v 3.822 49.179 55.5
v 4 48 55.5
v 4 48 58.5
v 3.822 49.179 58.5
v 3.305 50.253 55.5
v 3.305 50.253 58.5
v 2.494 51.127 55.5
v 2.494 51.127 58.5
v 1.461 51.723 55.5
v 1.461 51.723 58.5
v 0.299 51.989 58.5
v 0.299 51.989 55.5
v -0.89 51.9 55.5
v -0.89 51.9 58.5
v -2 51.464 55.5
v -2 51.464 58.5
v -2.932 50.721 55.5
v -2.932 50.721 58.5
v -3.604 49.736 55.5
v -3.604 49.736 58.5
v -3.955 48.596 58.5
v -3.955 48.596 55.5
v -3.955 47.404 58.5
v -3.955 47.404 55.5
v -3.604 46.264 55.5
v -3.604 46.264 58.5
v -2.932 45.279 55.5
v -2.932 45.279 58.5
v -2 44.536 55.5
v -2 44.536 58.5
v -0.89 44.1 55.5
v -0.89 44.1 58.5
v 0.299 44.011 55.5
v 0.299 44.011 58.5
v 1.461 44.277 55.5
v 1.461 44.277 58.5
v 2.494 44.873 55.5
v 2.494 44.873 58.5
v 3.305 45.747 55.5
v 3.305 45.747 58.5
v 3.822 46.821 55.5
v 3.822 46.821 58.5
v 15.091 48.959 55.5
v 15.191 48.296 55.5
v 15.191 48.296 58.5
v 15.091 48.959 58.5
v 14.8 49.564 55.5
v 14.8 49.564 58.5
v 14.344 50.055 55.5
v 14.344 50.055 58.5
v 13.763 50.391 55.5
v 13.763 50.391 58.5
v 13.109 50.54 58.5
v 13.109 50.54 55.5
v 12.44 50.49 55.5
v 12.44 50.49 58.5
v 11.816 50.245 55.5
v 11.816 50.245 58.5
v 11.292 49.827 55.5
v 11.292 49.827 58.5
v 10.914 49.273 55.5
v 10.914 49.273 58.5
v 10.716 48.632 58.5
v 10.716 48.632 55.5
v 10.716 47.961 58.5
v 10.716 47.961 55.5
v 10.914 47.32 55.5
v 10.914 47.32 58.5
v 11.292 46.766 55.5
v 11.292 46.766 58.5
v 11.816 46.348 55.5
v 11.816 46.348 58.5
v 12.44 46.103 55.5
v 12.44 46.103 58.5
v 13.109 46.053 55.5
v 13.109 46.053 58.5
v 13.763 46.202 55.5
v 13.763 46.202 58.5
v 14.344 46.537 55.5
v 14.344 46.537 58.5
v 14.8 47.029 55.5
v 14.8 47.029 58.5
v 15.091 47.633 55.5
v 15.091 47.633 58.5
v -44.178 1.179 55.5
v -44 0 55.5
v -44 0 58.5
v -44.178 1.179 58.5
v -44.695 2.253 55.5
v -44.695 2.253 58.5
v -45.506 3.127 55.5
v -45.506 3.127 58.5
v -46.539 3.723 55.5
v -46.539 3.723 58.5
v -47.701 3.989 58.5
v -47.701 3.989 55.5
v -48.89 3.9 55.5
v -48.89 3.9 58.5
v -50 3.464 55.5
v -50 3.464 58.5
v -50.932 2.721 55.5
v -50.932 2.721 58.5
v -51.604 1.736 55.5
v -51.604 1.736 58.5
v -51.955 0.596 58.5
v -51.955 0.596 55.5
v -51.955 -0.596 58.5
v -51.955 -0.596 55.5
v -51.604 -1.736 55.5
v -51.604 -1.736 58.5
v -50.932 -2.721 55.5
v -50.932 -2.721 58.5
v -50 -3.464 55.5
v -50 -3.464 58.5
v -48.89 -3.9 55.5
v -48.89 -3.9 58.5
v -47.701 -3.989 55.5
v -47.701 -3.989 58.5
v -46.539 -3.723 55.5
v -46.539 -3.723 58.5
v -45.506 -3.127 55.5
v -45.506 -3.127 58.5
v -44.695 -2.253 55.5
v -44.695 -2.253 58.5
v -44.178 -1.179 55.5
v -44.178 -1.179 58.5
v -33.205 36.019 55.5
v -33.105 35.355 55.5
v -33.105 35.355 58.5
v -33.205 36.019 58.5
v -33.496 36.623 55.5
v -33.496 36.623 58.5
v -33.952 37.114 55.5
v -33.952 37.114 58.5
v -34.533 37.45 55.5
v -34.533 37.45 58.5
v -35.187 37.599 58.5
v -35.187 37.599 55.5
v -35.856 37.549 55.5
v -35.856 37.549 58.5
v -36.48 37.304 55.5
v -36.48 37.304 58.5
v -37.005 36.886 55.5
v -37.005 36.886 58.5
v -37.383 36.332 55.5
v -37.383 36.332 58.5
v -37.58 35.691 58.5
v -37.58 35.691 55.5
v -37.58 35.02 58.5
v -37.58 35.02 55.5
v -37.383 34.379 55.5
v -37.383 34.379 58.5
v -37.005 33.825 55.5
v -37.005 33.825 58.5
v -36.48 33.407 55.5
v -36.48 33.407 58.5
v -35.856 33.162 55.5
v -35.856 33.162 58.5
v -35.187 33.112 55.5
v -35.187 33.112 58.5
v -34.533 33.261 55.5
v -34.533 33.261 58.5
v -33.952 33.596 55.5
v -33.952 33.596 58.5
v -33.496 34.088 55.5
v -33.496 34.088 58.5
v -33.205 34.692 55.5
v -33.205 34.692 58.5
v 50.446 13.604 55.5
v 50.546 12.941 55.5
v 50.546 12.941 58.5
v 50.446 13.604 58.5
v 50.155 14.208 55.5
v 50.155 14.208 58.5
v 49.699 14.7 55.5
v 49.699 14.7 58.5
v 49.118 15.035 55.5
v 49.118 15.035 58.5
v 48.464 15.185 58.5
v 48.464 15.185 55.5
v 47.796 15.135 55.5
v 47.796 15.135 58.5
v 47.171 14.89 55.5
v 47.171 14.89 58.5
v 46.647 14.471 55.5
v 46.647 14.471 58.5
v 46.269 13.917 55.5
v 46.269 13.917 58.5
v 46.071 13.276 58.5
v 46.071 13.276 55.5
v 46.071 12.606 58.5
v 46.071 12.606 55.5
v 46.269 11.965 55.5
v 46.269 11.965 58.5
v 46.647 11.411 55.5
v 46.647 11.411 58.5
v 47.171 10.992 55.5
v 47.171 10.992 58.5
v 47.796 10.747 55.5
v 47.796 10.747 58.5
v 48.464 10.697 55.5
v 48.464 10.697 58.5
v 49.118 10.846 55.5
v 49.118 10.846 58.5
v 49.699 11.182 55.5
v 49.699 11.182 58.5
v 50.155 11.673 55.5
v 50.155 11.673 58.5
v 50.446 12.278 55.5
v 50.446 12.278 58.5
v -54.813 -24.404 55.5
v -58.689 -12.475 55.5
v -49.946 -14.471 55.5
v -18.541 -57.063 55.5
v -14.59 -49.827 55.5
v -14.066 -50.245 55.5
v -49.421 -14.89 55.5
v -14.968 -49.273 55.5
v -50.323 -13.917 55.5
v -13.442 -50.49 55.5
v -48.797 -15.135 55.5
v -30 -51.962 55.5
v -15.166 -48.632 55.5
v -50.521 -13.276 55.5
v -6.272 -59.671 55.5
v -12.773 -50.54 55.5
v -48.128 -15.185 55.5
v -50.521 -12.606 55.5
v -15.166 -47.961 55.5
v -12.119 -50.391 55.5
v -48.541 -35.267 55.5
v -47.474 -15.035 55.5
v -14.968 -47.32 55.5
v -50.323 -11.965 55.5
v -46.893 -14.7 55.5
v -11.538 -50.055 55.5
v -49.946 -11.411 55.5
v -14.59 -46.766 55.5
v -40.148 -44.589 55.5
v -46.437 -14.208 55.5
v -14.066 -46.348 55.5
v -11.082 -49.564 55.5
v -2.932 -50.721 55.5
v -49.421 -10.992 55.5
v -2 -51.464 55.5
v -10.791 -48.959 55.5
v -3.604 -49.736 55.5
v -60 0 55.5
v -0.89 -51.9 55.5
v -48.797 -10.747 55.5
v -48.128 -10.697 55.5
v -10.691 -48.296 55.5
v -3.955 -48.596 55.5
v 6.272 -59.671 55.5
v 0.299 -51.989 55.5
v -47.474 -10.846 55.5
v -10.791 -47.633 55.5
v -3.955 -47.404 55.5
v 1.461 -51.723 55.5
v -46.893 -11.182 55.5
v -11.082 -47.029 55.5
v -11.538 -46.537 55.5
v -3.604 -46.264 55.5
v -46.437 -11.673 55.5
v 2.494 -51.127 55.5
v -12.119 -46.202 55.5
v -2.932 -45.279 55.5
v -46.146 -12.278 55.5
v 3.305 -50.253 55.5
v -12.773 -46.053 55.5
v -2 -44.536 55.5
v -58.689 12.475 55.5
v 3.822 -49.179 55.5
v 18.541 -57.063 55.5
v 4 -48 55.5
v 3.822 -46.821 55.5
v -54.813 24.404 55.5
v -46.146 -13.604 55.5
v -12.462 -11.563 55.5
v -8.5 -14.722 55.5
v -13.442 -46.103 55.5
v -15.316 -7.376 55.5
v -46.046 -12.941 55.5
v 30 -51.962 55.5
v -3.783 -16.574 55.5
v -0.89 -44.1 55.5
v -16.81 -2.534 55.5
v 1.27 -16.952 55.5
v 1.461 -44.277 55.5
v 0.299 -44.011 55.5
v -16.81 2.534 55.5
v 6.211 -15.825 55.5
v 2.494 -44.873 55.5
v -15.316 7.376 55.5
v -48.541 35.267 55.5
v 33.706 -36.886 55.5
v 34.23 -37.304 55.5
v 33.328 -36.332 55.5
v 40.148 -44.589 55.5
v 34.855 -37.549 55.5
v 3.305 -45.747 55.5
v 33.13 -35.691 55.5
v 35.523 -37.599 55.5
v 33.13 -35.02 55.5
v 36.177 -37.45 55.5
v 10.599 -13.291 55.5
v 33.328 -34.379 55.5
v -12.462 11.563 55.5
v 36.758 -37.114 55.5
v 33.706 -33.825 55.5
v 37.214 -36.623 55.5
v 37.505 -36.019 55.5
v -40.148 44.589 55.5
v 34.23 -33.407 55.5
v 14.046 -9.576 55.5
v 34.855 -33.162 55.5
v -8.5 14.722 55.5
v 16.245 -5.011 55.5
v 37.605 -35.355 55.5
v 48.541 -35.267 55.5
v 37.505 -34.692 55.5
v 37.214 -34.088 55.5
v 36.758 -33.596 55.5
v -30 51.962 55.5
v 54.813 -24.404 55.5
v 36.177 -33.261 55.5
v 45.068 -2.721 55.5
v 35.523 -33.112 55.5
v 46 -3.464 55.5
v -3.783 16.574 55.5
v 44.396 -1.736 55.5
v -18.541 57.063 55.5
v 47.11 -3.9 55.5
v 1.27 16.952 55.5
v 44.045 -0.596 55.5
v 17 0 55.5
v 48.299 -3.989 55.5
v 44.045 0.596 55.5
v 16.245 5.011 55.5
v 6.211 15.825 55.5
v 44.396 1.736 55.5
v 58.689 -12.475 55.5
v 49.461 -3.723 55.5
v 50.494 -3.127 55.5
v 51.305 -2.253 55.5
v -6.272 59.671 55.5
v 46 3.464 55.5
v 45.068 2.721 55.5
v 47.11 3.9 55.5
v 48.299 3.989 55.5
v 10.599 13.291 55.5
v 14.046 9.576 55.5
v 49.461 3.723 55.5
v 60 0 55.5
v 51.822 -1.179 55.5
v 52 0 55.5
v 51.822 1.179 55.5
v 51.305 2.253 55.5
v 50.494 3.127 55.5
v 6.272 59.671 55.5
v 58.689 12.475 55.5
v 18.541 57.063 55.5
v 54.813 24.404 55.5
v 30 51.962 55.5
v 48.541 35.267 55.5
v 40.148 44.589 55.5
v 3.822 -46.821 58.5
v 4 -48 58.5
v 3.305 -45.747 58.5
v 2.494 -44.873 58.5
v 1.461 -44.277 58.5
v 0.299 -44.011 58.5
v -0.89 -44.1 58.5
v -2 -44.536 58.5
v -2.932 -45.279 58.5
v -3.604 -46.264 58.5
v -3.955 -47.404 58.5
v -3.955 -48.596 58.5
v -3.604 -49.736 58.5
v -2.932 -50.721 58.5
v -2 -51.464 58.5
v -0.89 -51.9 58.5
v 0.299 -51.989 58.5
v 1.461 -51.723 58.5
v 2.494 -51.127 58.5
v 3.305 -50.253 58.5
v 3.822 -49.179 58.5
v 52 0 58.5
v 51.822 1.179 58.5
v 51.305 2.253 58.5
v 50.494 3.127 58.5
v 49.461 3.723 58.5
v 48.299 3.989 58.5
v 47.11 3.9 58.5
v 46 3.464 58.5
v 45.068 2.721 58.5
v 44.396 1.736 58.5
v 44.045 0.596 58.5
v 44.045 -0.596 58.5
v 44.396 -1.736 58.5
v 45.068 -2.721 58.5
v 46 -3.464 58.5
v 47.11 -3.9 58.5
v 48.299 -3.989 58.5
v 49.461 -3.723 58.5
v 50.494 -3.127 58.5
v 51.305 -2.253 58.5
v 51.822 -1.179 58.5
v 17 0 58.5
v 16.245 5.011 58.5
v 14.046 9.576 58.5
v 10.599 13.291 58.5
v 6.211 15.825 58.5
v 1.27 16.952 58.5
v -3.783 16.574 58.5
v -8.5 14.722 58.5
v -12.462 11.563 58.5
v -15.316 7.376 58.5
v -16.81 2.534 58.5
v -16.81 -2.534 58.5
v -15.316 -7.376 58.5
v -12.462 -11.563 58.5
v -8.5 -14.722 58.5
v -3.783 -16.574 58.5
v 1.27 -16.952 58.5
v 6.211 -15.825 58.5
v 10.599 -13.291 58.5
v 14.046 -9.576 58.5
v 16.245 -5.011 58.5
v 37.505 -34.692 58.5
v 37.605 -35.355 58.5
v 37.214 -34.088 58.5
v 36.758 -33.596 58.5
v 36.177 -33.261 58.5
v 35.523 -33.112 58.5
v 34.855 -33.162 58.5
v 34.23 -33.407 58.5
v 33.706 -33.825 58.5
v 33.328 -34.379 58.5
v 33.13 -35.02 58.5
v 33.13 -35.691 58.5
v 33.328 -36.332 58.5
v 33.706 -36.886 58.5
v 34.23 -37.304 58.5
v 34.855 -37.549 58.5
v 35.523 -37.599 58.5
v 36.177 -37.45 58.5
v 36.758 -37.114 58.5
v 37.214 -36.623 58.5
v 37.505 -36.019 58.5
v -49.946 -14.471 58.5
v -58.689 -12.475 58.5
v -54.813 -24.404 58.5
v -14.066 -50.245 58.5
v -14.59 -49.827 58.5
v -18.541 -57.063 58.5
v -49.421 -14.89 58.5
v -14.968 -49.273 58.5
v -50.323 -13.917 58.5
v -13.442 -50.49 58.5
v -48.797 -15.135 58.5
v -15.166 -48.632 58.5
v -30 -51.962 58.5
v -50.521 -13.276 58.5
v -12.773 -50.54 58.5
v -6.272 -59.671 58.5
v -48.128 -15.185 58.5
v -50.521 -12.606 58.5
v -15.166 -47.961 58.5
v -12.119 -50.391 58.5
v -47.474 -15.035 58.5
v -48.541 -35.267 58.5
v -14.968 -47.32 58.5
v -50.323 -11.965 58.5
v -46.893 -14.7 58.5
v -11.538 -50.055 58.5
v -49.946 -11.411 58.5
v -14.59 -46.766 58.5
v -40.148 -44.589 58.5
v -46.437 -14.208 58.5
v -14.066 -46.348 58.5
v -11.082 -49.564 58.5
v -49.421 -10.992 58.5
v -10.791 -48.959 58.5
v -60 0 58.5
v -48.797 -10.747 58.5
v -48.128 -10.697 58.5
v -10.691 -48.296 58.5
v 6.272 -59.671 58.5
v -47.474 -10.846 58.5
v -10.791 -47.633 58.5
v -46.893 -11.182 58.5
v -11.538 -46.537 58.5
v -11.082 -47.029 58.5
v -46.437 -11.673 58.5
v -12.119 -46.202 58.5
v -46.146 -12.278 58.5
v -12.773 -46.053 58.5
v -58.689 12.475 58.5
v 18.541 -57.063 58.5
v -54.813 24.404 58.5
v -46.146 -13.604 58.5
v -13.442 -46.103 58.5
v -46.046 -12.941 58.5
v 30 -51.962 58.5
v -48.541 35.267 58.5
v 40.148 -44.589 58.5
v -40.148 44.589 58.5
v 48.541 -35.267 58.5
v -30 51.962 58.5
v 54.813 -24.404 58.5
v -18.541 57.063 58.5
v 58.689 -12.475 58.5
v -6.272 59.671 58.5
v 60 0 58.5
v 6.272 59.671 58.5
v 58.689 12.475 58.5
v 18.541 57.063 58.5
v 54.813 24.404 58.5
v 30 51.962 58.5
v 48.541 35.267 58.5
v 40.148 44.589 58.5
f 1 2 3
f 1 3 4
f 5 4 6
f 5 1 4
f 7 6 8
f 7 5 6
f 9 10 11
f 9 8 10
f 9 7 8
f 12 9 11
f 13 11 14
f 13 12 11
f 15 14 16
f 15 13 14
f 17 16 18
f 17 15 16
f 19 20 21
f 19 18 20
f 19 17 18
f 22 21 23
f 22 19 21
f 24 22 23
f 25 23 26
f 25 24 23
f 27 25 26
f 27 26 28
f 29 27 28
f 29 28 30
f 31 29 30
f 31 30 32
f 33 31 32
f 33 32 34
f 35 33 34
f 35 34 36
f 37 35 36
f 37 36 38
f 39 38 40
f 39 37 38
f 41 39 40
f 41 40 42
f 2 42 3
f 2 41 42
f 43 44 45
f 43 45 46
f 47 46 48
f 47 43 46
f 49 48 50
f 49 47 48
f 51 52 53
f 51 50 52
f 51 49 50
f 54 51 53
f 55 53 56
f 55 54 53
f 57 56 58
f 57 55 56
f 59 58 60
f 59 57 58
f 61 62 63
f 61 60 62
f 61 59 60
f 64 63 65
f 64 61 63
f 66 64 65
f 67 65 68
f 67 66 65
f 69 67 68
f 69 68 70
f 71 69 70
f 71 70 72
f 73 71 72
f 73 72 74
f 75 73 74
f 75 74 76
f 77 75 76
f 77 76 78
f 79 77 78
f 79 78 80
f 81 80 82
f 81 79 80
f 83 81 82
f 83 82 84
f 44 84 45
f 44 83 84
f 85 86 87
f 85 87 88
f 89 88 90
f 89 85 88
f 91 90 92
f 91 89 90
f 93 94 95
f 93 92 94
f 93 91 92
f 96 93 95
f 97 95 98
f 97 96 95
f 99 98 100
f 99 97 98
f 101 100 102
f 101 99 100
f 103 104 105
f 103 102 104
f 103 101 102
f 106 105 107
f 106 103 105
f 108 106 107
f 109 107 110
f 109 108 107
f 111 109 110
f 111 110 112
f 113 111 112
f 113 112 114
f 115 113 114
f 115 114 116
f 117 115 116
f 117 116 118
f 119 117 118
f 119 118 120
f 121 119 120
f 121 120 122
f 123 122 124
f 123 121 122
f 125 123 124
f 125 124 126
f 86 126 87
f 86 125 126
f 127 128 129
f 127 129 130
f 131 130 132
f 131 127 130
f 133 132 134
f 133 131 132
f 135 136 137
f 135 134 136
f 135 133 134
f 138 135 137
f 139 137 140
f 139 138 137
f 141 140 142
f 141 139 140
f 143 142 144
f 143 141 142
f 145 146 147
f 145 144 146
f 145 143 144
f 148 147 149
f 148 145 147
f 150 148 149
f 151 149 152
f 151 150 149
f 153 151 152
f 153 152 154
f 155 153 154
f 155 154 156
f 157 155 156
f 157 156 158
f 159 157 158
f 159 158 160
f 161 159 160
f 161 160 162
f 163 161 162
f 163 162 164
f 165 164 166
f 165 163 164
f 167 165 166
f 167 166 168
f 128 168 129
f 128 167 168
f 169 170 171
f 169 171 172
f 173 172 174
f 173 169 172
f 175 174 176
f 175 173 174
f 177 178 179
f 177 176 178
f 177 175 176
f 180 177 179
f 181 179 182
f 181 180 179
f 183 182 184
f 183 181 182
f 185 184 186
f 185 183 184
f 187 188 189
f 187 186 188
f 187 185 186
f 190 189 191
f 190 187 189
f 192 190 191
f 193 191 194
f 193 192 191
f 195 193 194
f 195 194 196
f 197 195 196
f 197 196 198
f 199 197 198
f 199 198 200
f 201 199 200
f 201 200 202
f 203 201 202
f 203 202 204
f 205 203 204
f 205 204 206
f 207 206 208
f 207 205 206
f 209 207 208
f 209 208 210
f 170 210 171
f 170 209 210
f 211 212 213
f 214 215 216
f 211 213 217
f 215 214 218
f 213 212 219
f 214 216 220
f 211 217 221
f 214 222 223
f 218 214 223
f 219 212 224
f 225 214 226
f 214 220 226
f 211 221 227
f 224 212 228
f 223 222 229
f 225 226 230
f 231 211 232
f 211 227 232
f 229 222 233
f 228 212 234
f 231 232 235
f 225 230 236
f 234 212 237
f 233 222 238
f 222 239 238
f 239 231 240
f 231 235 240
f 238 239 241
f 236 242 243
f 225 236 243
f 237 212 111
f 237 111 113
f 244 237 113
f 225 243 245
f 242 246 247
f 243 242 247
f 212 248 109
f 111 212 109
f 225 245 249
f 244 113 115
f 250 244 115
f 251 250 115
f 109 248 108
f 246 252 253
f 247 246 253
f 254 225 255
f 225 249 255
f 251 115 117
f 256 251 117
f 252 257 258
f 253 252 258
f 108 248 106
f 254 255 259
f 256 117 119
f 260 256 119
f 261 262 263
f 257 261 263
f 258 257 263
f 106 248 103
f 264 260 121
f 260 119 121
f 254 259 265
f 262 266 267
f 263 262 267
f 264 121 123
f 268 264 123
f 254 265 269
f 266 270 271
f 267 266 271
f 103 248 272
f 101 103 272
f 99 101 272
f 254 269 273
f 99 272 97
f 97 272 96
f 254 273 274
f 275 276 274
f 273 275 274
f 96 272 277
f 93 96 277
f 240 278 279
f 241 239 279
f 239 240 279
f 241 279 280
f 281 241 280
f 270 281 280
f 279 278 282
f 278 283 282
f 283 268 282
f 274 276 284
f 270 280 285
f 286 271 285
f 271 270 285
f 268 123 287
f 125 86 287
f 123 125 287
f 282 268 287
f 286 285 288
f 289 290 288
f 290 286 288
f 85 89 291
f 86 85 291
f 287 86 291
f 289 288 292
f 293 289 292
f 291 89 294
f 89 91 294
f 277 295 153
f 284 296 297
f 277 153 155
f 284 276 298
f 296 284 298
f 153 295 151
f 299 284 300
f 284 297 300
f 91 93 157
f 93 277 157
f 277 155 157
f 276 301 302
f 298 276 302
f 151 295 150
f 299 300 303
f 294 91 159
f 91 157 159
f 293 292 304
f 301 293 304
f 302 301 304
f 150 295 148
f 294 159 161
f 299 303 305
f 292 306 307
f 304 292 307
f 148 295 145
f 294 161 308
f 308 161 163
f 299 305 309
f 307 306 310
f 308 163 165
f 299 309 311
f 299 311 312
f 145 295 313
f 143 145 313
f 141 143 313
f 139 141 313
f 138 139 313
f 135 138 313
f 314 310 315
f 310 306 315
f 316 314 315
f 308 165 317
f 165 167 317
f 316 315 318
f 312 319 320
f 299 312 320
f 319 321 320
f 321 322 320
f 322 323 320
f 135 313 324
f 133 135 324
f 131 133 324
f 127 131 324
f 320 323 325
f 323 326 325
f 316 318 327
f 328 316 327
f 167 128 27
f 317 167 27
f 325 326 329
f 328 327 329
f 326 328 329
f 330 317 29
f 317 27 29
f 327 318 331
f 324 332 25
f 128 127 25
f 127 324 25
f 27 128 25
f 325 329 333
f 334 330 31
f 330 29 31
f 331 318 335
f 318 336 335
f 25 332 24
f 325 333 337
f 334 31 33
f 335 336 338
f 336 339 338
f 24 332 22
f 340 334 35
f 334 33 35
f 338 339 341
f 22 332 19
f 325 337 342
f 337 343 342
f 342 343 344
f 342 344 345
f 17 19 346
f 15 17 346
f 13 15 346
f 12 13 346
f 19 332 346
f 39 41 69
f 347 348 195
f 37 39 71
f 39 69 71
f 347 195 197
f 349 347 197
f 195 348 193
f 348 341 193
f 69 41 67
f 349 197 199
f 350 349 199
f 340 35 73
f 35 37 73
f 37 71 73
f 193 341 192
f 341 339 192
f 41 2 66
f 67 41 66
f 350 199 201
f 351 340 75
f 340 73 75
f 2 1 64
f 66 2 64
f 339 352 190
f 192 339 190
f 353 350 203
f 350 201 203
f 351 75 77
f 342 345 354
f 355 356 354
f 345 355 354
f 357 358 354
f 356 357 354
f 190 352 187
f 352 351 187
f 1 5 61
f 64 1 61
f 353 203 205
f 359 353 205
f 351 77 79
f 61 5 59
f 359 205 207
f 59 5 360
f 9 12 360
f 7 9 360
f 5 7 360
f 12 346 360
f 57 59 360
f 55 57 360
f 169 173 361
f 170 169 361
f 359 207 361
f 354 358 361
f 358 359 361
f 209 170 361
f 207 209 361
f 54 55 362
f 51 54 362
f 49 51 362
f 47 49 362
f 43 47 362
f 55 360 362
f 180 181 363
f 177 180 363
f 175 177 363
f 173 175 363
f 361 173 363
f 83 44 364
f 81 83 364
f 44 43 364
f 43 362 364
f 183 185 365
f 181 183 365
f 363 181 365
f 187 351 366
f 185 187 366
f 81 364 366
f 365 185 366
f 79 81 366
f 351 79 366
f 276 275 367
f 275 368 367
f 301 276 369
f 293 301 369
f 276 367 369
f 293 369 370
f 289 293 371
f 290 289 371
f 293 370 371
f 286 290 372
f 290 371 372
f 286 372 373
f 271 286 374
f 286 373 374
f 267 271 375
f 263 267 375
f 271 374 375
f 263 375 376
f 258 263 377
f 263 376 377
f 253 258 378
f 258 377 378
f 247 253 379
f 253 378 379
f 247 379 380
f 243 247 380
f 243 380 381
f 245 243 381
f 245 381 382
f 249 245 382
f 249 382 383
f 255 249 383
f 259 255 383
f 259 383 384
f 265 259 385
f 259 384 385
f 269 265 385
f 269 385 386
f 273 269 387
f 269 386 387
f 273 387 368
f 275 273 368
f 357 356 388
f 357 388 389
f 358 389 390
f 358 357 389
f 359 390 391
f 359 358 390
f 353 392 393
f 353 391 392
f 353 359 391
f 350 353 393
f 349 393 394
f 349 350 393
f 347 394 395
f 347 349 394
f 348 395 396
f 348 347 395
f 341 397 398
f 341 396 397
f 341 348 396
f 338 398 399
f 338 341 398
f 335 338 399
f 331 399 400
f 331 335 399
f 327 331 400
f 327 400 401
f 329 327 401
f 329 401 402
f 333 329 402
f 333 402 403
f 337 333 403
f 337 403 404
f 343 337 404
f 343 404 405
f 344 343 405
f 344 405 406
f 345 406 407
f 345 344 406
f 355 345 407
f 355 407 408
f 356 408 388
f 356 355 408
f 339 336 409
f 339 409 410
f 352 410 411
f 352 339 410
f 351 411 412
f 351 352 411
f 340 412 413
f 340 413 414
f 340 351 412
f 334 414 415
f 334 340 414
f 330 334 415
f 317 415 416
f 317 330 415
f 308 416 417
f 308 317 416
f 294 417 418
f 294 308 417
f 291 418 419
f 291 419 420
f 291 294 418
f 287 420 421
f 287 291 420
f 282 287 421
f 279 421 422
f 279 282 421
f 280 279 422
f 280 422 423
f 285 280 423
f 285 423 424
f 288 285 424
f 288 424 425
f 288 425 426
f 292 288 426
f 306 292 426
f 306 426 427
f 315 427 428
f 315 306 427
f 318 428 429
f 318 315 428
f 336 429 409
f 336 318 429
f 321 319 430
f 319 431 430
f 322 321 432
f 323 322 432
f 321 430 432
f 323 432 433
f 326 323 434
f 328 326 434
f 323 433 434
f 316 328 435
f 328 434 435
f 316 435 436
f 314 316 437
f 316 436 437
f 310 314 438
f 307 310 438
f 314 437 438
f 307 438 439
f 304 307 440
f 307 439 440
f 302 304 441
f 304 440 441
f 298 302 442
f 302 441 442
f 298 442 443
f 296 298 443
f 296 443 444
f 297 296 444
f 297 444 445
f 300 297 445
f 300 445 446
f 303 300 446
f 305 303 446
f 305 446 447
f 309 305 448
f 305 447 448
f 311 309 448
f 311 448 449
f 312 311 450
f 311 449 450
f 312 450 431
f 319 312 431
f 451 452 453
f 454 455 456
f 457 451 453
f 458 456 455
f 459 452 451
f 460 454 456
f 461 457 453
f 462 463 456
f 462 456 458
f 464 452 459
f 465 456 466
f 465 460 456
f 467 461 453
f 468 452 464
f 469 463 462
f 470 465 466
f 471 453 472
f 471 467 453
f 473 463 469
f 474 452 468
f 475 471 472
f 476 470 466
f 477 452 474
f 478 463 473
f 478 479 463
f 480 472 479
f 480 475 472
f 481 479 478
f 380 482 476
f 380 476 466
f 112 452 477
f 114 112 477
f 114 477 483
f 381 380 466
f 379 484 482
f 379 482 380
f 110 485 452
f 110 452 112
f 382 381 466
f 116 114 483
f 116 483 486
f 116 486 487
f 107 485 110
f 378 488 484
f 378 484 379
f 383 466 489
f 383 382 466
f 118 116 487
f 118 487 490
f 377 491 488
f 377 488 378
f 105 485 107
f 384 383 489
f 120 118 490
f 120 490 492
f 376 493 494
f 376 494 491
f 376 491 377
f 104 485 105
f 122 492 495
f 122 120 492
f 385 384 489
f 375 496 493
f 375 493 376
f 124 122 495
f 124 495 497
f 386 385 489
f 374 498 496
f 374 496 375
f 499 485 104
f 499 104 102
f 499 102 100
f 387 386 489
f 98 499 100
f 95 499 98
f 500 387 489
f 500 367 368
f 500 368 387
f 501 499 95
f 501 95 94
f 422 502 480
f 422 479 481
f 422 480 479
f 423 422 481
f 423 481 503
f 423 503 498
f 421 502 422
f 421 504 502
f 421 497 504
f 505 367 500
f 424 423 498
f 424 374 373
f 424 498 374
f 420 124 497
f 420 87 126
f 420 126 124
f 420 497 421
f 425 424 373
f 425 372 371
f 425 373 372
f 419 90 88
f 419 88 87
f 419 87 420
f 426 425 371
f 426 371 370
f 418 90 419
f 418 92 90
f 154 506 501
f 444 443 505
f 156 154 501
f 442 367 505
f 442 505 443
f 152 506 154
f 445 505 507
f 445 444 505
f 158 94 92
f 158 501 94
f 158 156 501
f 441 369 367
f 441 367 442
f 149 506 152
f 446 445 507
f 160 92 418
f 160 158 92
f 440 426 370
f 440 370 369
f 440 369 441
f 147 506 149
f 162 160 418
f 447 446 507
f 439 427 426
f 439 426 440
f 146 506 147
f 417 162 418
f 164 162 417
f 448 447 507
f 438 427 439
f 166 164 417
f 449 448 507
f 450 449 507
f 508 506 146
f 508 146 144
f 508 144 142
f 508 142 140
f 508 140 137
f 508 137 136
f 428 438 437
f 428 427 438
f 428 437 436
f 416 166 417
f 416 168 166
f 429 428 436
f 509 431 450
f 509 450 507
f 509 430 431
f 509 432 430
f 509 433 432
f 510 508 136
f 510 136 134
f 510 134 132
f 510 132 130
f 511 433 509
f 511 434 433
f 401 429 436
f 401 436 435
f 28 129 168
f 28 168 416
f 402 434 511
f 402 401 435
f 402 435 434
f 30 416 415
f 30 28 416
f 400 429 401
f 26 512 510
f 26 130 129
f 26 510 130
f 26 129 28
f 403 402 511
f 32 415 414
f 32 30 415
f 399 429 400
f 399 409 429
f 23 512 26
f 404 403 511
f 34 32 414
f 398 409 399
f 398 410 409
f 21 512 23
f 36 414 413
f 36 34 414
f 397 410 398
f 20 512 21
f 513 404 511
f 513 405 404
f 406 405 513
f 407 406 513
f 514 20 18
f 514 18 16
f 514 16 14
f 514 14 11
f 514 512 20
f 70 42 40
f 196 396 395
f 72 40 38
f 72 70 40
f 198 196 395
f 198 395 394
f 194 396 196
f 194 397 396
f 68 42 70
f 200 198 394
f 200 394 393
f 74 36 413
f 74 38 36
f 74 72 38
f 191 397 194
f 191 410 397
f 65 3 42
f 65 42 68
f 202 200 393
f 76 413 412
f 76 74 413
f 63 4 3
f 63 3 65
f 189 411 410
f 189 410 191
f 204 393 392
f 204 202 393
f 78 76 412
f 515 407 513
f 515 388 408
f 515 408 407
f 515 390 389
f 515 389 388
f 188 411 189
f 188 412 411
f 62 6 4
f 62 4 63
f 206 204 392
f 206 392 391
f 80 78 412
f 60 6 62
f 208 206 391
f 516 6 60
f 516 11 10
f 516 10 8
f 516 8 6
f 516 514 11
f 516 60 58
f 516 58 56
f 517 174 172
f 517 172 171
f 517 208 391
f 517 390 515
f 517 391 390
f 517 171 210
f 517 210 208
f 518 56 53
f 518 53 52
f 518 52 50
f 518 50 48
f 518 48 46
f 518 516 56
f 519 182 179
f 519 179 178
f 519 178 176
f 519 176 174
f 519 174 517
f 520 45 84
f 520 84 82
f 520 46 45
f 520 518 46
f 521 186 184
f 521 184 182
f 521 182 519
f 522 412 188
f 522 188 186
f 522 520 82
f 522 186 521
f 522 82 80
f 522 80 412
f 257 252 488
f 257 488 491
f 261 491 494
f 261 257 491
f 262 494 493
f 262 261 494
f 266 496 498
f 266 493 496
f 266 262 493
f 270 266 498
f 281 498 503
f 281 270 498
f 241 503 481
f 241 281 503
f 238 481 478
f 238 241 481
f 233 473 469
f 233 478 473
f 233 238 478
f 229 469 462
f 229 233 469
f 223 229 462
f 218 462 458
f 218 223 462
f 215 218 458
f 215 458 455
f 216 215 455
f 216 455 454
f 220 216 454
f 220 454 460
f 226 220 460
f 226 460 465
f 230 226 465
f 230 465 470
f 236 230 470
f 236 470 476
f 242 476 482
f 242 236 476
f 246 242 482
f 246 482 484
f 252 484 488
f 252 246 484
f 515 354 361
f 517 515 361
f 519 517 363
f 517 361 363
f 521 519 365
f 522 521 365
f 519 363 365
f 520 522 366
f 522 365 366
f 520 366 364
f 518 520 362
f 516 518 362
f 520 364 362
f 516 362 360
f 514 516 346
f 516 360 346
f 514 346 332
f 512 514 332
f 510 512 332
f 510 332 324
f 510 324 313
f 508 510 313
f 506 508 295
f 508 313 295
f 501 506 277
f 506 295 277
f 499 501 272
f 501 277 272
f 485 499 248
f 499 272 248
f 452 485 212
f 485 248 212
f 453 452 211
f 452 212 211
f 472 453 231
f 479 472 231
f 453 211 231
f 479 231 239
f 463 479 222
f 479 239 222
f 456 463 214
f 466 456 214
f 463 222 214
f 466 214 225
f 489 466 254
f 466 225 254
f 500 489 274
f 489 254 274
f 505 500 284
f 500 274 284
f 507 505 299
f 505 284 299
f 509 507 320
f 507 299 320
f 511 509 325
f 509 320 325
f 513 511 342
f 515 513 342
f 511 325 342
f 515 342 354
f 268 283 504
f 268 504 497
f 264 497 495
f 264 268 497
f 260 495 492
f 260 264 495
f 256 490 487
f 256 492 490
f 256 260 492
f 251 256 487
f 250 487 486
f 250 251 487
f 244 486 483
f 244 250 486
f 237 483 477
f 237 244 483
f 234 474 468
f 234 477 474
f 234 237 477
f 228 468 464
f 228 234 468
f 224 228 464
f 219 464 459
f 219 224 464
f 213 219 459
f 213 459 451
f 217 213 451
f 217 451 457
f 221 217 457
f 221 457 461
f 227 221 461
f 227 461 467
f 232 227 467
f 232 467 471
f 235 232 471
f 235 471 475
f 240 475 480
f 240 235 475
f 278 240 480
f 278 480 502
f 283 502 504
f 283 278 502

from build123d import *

# Parameters (mm, degrees)
CARRIER_FRONT_START = 55.5
SKETCH_1_R          = 60
SKETCH_1_R_2        = 17
CARRIER_FRONT_DEPTH = 3
SKETCH_2_R          = 2.25
THROUGH_HOLES_DEPTH = 100
SKETCH_3_R          = 4
CUT_EXTRUDE_2_DEPTH = 100


with BuildPart() as part:
    # Эскиз1 → Carrier_front (new body)
    with BuildSketch(Plane.XY.offset(CARRIER_FRONT_START)):
        Circle(SKETCH_1_R)
        Circle(SKETCH_1_R_2, mode=Mode.SUBTRACT)
    extrude(amount=CARRIER_FRONT_DEPTH)

    # Эскиз2 → Through_holes (cut, symmetric)
    with BuildSketch(Plane.XY):
        with Locations((48, 0)):
            Circle(SKETCH_2_R)
        with Locations((0, 48)):
            Circle(SKETCH_2_R)
        with Locations((-48, 0)):
            Circle(SKETCH_2_R)
        with Locations((0, -48)):
            Circle(SKETCH_2_R)
        with Locations((48.296291314, 12.940952255)):
            Circle(SKETCH_2_R)
        with Locations((12.940952255, 48.296291314)):
            Circle(SKETCH_2_R)
        with Locations((-35.355339059, 35.355339059)):
            Circle(SKETCH_2_R)
        with Locations((-48.296291314, -12.940952255)):
            Circle(SKETCH_2_R)
        with Locations((-12.940952255, -48.296291314)):
            Circle(SKETCH_2_R)
        with Locations((35.355339059, -35.355339059)):
            Circle(SKETCH_2_R)
    extrude(amount=THROUGH_HOLES_DEPTH, both=True, mode=Mode.SUBTRACT)

    # Эскиз3 → Вырез-Вытянуть2 (cut, symmetric)
    with BuildSketch(Plane.XY):
        with Locations((48, 0)):
            Circle(SKETCH_3_R)
        with Locations((0, 48)):
            Circle(SKETCH_3_R)
        with Locations((-48, 0)):
            Circle(SKETCH_3_R)
        with Locations((0, -48)):
            Circle(SKETCH_3_R)
    extrude(amount=CUT_EXTRUDE_2_DEPTH, both=True, mode=Mode.SUBTRACT)


solid = part.part
